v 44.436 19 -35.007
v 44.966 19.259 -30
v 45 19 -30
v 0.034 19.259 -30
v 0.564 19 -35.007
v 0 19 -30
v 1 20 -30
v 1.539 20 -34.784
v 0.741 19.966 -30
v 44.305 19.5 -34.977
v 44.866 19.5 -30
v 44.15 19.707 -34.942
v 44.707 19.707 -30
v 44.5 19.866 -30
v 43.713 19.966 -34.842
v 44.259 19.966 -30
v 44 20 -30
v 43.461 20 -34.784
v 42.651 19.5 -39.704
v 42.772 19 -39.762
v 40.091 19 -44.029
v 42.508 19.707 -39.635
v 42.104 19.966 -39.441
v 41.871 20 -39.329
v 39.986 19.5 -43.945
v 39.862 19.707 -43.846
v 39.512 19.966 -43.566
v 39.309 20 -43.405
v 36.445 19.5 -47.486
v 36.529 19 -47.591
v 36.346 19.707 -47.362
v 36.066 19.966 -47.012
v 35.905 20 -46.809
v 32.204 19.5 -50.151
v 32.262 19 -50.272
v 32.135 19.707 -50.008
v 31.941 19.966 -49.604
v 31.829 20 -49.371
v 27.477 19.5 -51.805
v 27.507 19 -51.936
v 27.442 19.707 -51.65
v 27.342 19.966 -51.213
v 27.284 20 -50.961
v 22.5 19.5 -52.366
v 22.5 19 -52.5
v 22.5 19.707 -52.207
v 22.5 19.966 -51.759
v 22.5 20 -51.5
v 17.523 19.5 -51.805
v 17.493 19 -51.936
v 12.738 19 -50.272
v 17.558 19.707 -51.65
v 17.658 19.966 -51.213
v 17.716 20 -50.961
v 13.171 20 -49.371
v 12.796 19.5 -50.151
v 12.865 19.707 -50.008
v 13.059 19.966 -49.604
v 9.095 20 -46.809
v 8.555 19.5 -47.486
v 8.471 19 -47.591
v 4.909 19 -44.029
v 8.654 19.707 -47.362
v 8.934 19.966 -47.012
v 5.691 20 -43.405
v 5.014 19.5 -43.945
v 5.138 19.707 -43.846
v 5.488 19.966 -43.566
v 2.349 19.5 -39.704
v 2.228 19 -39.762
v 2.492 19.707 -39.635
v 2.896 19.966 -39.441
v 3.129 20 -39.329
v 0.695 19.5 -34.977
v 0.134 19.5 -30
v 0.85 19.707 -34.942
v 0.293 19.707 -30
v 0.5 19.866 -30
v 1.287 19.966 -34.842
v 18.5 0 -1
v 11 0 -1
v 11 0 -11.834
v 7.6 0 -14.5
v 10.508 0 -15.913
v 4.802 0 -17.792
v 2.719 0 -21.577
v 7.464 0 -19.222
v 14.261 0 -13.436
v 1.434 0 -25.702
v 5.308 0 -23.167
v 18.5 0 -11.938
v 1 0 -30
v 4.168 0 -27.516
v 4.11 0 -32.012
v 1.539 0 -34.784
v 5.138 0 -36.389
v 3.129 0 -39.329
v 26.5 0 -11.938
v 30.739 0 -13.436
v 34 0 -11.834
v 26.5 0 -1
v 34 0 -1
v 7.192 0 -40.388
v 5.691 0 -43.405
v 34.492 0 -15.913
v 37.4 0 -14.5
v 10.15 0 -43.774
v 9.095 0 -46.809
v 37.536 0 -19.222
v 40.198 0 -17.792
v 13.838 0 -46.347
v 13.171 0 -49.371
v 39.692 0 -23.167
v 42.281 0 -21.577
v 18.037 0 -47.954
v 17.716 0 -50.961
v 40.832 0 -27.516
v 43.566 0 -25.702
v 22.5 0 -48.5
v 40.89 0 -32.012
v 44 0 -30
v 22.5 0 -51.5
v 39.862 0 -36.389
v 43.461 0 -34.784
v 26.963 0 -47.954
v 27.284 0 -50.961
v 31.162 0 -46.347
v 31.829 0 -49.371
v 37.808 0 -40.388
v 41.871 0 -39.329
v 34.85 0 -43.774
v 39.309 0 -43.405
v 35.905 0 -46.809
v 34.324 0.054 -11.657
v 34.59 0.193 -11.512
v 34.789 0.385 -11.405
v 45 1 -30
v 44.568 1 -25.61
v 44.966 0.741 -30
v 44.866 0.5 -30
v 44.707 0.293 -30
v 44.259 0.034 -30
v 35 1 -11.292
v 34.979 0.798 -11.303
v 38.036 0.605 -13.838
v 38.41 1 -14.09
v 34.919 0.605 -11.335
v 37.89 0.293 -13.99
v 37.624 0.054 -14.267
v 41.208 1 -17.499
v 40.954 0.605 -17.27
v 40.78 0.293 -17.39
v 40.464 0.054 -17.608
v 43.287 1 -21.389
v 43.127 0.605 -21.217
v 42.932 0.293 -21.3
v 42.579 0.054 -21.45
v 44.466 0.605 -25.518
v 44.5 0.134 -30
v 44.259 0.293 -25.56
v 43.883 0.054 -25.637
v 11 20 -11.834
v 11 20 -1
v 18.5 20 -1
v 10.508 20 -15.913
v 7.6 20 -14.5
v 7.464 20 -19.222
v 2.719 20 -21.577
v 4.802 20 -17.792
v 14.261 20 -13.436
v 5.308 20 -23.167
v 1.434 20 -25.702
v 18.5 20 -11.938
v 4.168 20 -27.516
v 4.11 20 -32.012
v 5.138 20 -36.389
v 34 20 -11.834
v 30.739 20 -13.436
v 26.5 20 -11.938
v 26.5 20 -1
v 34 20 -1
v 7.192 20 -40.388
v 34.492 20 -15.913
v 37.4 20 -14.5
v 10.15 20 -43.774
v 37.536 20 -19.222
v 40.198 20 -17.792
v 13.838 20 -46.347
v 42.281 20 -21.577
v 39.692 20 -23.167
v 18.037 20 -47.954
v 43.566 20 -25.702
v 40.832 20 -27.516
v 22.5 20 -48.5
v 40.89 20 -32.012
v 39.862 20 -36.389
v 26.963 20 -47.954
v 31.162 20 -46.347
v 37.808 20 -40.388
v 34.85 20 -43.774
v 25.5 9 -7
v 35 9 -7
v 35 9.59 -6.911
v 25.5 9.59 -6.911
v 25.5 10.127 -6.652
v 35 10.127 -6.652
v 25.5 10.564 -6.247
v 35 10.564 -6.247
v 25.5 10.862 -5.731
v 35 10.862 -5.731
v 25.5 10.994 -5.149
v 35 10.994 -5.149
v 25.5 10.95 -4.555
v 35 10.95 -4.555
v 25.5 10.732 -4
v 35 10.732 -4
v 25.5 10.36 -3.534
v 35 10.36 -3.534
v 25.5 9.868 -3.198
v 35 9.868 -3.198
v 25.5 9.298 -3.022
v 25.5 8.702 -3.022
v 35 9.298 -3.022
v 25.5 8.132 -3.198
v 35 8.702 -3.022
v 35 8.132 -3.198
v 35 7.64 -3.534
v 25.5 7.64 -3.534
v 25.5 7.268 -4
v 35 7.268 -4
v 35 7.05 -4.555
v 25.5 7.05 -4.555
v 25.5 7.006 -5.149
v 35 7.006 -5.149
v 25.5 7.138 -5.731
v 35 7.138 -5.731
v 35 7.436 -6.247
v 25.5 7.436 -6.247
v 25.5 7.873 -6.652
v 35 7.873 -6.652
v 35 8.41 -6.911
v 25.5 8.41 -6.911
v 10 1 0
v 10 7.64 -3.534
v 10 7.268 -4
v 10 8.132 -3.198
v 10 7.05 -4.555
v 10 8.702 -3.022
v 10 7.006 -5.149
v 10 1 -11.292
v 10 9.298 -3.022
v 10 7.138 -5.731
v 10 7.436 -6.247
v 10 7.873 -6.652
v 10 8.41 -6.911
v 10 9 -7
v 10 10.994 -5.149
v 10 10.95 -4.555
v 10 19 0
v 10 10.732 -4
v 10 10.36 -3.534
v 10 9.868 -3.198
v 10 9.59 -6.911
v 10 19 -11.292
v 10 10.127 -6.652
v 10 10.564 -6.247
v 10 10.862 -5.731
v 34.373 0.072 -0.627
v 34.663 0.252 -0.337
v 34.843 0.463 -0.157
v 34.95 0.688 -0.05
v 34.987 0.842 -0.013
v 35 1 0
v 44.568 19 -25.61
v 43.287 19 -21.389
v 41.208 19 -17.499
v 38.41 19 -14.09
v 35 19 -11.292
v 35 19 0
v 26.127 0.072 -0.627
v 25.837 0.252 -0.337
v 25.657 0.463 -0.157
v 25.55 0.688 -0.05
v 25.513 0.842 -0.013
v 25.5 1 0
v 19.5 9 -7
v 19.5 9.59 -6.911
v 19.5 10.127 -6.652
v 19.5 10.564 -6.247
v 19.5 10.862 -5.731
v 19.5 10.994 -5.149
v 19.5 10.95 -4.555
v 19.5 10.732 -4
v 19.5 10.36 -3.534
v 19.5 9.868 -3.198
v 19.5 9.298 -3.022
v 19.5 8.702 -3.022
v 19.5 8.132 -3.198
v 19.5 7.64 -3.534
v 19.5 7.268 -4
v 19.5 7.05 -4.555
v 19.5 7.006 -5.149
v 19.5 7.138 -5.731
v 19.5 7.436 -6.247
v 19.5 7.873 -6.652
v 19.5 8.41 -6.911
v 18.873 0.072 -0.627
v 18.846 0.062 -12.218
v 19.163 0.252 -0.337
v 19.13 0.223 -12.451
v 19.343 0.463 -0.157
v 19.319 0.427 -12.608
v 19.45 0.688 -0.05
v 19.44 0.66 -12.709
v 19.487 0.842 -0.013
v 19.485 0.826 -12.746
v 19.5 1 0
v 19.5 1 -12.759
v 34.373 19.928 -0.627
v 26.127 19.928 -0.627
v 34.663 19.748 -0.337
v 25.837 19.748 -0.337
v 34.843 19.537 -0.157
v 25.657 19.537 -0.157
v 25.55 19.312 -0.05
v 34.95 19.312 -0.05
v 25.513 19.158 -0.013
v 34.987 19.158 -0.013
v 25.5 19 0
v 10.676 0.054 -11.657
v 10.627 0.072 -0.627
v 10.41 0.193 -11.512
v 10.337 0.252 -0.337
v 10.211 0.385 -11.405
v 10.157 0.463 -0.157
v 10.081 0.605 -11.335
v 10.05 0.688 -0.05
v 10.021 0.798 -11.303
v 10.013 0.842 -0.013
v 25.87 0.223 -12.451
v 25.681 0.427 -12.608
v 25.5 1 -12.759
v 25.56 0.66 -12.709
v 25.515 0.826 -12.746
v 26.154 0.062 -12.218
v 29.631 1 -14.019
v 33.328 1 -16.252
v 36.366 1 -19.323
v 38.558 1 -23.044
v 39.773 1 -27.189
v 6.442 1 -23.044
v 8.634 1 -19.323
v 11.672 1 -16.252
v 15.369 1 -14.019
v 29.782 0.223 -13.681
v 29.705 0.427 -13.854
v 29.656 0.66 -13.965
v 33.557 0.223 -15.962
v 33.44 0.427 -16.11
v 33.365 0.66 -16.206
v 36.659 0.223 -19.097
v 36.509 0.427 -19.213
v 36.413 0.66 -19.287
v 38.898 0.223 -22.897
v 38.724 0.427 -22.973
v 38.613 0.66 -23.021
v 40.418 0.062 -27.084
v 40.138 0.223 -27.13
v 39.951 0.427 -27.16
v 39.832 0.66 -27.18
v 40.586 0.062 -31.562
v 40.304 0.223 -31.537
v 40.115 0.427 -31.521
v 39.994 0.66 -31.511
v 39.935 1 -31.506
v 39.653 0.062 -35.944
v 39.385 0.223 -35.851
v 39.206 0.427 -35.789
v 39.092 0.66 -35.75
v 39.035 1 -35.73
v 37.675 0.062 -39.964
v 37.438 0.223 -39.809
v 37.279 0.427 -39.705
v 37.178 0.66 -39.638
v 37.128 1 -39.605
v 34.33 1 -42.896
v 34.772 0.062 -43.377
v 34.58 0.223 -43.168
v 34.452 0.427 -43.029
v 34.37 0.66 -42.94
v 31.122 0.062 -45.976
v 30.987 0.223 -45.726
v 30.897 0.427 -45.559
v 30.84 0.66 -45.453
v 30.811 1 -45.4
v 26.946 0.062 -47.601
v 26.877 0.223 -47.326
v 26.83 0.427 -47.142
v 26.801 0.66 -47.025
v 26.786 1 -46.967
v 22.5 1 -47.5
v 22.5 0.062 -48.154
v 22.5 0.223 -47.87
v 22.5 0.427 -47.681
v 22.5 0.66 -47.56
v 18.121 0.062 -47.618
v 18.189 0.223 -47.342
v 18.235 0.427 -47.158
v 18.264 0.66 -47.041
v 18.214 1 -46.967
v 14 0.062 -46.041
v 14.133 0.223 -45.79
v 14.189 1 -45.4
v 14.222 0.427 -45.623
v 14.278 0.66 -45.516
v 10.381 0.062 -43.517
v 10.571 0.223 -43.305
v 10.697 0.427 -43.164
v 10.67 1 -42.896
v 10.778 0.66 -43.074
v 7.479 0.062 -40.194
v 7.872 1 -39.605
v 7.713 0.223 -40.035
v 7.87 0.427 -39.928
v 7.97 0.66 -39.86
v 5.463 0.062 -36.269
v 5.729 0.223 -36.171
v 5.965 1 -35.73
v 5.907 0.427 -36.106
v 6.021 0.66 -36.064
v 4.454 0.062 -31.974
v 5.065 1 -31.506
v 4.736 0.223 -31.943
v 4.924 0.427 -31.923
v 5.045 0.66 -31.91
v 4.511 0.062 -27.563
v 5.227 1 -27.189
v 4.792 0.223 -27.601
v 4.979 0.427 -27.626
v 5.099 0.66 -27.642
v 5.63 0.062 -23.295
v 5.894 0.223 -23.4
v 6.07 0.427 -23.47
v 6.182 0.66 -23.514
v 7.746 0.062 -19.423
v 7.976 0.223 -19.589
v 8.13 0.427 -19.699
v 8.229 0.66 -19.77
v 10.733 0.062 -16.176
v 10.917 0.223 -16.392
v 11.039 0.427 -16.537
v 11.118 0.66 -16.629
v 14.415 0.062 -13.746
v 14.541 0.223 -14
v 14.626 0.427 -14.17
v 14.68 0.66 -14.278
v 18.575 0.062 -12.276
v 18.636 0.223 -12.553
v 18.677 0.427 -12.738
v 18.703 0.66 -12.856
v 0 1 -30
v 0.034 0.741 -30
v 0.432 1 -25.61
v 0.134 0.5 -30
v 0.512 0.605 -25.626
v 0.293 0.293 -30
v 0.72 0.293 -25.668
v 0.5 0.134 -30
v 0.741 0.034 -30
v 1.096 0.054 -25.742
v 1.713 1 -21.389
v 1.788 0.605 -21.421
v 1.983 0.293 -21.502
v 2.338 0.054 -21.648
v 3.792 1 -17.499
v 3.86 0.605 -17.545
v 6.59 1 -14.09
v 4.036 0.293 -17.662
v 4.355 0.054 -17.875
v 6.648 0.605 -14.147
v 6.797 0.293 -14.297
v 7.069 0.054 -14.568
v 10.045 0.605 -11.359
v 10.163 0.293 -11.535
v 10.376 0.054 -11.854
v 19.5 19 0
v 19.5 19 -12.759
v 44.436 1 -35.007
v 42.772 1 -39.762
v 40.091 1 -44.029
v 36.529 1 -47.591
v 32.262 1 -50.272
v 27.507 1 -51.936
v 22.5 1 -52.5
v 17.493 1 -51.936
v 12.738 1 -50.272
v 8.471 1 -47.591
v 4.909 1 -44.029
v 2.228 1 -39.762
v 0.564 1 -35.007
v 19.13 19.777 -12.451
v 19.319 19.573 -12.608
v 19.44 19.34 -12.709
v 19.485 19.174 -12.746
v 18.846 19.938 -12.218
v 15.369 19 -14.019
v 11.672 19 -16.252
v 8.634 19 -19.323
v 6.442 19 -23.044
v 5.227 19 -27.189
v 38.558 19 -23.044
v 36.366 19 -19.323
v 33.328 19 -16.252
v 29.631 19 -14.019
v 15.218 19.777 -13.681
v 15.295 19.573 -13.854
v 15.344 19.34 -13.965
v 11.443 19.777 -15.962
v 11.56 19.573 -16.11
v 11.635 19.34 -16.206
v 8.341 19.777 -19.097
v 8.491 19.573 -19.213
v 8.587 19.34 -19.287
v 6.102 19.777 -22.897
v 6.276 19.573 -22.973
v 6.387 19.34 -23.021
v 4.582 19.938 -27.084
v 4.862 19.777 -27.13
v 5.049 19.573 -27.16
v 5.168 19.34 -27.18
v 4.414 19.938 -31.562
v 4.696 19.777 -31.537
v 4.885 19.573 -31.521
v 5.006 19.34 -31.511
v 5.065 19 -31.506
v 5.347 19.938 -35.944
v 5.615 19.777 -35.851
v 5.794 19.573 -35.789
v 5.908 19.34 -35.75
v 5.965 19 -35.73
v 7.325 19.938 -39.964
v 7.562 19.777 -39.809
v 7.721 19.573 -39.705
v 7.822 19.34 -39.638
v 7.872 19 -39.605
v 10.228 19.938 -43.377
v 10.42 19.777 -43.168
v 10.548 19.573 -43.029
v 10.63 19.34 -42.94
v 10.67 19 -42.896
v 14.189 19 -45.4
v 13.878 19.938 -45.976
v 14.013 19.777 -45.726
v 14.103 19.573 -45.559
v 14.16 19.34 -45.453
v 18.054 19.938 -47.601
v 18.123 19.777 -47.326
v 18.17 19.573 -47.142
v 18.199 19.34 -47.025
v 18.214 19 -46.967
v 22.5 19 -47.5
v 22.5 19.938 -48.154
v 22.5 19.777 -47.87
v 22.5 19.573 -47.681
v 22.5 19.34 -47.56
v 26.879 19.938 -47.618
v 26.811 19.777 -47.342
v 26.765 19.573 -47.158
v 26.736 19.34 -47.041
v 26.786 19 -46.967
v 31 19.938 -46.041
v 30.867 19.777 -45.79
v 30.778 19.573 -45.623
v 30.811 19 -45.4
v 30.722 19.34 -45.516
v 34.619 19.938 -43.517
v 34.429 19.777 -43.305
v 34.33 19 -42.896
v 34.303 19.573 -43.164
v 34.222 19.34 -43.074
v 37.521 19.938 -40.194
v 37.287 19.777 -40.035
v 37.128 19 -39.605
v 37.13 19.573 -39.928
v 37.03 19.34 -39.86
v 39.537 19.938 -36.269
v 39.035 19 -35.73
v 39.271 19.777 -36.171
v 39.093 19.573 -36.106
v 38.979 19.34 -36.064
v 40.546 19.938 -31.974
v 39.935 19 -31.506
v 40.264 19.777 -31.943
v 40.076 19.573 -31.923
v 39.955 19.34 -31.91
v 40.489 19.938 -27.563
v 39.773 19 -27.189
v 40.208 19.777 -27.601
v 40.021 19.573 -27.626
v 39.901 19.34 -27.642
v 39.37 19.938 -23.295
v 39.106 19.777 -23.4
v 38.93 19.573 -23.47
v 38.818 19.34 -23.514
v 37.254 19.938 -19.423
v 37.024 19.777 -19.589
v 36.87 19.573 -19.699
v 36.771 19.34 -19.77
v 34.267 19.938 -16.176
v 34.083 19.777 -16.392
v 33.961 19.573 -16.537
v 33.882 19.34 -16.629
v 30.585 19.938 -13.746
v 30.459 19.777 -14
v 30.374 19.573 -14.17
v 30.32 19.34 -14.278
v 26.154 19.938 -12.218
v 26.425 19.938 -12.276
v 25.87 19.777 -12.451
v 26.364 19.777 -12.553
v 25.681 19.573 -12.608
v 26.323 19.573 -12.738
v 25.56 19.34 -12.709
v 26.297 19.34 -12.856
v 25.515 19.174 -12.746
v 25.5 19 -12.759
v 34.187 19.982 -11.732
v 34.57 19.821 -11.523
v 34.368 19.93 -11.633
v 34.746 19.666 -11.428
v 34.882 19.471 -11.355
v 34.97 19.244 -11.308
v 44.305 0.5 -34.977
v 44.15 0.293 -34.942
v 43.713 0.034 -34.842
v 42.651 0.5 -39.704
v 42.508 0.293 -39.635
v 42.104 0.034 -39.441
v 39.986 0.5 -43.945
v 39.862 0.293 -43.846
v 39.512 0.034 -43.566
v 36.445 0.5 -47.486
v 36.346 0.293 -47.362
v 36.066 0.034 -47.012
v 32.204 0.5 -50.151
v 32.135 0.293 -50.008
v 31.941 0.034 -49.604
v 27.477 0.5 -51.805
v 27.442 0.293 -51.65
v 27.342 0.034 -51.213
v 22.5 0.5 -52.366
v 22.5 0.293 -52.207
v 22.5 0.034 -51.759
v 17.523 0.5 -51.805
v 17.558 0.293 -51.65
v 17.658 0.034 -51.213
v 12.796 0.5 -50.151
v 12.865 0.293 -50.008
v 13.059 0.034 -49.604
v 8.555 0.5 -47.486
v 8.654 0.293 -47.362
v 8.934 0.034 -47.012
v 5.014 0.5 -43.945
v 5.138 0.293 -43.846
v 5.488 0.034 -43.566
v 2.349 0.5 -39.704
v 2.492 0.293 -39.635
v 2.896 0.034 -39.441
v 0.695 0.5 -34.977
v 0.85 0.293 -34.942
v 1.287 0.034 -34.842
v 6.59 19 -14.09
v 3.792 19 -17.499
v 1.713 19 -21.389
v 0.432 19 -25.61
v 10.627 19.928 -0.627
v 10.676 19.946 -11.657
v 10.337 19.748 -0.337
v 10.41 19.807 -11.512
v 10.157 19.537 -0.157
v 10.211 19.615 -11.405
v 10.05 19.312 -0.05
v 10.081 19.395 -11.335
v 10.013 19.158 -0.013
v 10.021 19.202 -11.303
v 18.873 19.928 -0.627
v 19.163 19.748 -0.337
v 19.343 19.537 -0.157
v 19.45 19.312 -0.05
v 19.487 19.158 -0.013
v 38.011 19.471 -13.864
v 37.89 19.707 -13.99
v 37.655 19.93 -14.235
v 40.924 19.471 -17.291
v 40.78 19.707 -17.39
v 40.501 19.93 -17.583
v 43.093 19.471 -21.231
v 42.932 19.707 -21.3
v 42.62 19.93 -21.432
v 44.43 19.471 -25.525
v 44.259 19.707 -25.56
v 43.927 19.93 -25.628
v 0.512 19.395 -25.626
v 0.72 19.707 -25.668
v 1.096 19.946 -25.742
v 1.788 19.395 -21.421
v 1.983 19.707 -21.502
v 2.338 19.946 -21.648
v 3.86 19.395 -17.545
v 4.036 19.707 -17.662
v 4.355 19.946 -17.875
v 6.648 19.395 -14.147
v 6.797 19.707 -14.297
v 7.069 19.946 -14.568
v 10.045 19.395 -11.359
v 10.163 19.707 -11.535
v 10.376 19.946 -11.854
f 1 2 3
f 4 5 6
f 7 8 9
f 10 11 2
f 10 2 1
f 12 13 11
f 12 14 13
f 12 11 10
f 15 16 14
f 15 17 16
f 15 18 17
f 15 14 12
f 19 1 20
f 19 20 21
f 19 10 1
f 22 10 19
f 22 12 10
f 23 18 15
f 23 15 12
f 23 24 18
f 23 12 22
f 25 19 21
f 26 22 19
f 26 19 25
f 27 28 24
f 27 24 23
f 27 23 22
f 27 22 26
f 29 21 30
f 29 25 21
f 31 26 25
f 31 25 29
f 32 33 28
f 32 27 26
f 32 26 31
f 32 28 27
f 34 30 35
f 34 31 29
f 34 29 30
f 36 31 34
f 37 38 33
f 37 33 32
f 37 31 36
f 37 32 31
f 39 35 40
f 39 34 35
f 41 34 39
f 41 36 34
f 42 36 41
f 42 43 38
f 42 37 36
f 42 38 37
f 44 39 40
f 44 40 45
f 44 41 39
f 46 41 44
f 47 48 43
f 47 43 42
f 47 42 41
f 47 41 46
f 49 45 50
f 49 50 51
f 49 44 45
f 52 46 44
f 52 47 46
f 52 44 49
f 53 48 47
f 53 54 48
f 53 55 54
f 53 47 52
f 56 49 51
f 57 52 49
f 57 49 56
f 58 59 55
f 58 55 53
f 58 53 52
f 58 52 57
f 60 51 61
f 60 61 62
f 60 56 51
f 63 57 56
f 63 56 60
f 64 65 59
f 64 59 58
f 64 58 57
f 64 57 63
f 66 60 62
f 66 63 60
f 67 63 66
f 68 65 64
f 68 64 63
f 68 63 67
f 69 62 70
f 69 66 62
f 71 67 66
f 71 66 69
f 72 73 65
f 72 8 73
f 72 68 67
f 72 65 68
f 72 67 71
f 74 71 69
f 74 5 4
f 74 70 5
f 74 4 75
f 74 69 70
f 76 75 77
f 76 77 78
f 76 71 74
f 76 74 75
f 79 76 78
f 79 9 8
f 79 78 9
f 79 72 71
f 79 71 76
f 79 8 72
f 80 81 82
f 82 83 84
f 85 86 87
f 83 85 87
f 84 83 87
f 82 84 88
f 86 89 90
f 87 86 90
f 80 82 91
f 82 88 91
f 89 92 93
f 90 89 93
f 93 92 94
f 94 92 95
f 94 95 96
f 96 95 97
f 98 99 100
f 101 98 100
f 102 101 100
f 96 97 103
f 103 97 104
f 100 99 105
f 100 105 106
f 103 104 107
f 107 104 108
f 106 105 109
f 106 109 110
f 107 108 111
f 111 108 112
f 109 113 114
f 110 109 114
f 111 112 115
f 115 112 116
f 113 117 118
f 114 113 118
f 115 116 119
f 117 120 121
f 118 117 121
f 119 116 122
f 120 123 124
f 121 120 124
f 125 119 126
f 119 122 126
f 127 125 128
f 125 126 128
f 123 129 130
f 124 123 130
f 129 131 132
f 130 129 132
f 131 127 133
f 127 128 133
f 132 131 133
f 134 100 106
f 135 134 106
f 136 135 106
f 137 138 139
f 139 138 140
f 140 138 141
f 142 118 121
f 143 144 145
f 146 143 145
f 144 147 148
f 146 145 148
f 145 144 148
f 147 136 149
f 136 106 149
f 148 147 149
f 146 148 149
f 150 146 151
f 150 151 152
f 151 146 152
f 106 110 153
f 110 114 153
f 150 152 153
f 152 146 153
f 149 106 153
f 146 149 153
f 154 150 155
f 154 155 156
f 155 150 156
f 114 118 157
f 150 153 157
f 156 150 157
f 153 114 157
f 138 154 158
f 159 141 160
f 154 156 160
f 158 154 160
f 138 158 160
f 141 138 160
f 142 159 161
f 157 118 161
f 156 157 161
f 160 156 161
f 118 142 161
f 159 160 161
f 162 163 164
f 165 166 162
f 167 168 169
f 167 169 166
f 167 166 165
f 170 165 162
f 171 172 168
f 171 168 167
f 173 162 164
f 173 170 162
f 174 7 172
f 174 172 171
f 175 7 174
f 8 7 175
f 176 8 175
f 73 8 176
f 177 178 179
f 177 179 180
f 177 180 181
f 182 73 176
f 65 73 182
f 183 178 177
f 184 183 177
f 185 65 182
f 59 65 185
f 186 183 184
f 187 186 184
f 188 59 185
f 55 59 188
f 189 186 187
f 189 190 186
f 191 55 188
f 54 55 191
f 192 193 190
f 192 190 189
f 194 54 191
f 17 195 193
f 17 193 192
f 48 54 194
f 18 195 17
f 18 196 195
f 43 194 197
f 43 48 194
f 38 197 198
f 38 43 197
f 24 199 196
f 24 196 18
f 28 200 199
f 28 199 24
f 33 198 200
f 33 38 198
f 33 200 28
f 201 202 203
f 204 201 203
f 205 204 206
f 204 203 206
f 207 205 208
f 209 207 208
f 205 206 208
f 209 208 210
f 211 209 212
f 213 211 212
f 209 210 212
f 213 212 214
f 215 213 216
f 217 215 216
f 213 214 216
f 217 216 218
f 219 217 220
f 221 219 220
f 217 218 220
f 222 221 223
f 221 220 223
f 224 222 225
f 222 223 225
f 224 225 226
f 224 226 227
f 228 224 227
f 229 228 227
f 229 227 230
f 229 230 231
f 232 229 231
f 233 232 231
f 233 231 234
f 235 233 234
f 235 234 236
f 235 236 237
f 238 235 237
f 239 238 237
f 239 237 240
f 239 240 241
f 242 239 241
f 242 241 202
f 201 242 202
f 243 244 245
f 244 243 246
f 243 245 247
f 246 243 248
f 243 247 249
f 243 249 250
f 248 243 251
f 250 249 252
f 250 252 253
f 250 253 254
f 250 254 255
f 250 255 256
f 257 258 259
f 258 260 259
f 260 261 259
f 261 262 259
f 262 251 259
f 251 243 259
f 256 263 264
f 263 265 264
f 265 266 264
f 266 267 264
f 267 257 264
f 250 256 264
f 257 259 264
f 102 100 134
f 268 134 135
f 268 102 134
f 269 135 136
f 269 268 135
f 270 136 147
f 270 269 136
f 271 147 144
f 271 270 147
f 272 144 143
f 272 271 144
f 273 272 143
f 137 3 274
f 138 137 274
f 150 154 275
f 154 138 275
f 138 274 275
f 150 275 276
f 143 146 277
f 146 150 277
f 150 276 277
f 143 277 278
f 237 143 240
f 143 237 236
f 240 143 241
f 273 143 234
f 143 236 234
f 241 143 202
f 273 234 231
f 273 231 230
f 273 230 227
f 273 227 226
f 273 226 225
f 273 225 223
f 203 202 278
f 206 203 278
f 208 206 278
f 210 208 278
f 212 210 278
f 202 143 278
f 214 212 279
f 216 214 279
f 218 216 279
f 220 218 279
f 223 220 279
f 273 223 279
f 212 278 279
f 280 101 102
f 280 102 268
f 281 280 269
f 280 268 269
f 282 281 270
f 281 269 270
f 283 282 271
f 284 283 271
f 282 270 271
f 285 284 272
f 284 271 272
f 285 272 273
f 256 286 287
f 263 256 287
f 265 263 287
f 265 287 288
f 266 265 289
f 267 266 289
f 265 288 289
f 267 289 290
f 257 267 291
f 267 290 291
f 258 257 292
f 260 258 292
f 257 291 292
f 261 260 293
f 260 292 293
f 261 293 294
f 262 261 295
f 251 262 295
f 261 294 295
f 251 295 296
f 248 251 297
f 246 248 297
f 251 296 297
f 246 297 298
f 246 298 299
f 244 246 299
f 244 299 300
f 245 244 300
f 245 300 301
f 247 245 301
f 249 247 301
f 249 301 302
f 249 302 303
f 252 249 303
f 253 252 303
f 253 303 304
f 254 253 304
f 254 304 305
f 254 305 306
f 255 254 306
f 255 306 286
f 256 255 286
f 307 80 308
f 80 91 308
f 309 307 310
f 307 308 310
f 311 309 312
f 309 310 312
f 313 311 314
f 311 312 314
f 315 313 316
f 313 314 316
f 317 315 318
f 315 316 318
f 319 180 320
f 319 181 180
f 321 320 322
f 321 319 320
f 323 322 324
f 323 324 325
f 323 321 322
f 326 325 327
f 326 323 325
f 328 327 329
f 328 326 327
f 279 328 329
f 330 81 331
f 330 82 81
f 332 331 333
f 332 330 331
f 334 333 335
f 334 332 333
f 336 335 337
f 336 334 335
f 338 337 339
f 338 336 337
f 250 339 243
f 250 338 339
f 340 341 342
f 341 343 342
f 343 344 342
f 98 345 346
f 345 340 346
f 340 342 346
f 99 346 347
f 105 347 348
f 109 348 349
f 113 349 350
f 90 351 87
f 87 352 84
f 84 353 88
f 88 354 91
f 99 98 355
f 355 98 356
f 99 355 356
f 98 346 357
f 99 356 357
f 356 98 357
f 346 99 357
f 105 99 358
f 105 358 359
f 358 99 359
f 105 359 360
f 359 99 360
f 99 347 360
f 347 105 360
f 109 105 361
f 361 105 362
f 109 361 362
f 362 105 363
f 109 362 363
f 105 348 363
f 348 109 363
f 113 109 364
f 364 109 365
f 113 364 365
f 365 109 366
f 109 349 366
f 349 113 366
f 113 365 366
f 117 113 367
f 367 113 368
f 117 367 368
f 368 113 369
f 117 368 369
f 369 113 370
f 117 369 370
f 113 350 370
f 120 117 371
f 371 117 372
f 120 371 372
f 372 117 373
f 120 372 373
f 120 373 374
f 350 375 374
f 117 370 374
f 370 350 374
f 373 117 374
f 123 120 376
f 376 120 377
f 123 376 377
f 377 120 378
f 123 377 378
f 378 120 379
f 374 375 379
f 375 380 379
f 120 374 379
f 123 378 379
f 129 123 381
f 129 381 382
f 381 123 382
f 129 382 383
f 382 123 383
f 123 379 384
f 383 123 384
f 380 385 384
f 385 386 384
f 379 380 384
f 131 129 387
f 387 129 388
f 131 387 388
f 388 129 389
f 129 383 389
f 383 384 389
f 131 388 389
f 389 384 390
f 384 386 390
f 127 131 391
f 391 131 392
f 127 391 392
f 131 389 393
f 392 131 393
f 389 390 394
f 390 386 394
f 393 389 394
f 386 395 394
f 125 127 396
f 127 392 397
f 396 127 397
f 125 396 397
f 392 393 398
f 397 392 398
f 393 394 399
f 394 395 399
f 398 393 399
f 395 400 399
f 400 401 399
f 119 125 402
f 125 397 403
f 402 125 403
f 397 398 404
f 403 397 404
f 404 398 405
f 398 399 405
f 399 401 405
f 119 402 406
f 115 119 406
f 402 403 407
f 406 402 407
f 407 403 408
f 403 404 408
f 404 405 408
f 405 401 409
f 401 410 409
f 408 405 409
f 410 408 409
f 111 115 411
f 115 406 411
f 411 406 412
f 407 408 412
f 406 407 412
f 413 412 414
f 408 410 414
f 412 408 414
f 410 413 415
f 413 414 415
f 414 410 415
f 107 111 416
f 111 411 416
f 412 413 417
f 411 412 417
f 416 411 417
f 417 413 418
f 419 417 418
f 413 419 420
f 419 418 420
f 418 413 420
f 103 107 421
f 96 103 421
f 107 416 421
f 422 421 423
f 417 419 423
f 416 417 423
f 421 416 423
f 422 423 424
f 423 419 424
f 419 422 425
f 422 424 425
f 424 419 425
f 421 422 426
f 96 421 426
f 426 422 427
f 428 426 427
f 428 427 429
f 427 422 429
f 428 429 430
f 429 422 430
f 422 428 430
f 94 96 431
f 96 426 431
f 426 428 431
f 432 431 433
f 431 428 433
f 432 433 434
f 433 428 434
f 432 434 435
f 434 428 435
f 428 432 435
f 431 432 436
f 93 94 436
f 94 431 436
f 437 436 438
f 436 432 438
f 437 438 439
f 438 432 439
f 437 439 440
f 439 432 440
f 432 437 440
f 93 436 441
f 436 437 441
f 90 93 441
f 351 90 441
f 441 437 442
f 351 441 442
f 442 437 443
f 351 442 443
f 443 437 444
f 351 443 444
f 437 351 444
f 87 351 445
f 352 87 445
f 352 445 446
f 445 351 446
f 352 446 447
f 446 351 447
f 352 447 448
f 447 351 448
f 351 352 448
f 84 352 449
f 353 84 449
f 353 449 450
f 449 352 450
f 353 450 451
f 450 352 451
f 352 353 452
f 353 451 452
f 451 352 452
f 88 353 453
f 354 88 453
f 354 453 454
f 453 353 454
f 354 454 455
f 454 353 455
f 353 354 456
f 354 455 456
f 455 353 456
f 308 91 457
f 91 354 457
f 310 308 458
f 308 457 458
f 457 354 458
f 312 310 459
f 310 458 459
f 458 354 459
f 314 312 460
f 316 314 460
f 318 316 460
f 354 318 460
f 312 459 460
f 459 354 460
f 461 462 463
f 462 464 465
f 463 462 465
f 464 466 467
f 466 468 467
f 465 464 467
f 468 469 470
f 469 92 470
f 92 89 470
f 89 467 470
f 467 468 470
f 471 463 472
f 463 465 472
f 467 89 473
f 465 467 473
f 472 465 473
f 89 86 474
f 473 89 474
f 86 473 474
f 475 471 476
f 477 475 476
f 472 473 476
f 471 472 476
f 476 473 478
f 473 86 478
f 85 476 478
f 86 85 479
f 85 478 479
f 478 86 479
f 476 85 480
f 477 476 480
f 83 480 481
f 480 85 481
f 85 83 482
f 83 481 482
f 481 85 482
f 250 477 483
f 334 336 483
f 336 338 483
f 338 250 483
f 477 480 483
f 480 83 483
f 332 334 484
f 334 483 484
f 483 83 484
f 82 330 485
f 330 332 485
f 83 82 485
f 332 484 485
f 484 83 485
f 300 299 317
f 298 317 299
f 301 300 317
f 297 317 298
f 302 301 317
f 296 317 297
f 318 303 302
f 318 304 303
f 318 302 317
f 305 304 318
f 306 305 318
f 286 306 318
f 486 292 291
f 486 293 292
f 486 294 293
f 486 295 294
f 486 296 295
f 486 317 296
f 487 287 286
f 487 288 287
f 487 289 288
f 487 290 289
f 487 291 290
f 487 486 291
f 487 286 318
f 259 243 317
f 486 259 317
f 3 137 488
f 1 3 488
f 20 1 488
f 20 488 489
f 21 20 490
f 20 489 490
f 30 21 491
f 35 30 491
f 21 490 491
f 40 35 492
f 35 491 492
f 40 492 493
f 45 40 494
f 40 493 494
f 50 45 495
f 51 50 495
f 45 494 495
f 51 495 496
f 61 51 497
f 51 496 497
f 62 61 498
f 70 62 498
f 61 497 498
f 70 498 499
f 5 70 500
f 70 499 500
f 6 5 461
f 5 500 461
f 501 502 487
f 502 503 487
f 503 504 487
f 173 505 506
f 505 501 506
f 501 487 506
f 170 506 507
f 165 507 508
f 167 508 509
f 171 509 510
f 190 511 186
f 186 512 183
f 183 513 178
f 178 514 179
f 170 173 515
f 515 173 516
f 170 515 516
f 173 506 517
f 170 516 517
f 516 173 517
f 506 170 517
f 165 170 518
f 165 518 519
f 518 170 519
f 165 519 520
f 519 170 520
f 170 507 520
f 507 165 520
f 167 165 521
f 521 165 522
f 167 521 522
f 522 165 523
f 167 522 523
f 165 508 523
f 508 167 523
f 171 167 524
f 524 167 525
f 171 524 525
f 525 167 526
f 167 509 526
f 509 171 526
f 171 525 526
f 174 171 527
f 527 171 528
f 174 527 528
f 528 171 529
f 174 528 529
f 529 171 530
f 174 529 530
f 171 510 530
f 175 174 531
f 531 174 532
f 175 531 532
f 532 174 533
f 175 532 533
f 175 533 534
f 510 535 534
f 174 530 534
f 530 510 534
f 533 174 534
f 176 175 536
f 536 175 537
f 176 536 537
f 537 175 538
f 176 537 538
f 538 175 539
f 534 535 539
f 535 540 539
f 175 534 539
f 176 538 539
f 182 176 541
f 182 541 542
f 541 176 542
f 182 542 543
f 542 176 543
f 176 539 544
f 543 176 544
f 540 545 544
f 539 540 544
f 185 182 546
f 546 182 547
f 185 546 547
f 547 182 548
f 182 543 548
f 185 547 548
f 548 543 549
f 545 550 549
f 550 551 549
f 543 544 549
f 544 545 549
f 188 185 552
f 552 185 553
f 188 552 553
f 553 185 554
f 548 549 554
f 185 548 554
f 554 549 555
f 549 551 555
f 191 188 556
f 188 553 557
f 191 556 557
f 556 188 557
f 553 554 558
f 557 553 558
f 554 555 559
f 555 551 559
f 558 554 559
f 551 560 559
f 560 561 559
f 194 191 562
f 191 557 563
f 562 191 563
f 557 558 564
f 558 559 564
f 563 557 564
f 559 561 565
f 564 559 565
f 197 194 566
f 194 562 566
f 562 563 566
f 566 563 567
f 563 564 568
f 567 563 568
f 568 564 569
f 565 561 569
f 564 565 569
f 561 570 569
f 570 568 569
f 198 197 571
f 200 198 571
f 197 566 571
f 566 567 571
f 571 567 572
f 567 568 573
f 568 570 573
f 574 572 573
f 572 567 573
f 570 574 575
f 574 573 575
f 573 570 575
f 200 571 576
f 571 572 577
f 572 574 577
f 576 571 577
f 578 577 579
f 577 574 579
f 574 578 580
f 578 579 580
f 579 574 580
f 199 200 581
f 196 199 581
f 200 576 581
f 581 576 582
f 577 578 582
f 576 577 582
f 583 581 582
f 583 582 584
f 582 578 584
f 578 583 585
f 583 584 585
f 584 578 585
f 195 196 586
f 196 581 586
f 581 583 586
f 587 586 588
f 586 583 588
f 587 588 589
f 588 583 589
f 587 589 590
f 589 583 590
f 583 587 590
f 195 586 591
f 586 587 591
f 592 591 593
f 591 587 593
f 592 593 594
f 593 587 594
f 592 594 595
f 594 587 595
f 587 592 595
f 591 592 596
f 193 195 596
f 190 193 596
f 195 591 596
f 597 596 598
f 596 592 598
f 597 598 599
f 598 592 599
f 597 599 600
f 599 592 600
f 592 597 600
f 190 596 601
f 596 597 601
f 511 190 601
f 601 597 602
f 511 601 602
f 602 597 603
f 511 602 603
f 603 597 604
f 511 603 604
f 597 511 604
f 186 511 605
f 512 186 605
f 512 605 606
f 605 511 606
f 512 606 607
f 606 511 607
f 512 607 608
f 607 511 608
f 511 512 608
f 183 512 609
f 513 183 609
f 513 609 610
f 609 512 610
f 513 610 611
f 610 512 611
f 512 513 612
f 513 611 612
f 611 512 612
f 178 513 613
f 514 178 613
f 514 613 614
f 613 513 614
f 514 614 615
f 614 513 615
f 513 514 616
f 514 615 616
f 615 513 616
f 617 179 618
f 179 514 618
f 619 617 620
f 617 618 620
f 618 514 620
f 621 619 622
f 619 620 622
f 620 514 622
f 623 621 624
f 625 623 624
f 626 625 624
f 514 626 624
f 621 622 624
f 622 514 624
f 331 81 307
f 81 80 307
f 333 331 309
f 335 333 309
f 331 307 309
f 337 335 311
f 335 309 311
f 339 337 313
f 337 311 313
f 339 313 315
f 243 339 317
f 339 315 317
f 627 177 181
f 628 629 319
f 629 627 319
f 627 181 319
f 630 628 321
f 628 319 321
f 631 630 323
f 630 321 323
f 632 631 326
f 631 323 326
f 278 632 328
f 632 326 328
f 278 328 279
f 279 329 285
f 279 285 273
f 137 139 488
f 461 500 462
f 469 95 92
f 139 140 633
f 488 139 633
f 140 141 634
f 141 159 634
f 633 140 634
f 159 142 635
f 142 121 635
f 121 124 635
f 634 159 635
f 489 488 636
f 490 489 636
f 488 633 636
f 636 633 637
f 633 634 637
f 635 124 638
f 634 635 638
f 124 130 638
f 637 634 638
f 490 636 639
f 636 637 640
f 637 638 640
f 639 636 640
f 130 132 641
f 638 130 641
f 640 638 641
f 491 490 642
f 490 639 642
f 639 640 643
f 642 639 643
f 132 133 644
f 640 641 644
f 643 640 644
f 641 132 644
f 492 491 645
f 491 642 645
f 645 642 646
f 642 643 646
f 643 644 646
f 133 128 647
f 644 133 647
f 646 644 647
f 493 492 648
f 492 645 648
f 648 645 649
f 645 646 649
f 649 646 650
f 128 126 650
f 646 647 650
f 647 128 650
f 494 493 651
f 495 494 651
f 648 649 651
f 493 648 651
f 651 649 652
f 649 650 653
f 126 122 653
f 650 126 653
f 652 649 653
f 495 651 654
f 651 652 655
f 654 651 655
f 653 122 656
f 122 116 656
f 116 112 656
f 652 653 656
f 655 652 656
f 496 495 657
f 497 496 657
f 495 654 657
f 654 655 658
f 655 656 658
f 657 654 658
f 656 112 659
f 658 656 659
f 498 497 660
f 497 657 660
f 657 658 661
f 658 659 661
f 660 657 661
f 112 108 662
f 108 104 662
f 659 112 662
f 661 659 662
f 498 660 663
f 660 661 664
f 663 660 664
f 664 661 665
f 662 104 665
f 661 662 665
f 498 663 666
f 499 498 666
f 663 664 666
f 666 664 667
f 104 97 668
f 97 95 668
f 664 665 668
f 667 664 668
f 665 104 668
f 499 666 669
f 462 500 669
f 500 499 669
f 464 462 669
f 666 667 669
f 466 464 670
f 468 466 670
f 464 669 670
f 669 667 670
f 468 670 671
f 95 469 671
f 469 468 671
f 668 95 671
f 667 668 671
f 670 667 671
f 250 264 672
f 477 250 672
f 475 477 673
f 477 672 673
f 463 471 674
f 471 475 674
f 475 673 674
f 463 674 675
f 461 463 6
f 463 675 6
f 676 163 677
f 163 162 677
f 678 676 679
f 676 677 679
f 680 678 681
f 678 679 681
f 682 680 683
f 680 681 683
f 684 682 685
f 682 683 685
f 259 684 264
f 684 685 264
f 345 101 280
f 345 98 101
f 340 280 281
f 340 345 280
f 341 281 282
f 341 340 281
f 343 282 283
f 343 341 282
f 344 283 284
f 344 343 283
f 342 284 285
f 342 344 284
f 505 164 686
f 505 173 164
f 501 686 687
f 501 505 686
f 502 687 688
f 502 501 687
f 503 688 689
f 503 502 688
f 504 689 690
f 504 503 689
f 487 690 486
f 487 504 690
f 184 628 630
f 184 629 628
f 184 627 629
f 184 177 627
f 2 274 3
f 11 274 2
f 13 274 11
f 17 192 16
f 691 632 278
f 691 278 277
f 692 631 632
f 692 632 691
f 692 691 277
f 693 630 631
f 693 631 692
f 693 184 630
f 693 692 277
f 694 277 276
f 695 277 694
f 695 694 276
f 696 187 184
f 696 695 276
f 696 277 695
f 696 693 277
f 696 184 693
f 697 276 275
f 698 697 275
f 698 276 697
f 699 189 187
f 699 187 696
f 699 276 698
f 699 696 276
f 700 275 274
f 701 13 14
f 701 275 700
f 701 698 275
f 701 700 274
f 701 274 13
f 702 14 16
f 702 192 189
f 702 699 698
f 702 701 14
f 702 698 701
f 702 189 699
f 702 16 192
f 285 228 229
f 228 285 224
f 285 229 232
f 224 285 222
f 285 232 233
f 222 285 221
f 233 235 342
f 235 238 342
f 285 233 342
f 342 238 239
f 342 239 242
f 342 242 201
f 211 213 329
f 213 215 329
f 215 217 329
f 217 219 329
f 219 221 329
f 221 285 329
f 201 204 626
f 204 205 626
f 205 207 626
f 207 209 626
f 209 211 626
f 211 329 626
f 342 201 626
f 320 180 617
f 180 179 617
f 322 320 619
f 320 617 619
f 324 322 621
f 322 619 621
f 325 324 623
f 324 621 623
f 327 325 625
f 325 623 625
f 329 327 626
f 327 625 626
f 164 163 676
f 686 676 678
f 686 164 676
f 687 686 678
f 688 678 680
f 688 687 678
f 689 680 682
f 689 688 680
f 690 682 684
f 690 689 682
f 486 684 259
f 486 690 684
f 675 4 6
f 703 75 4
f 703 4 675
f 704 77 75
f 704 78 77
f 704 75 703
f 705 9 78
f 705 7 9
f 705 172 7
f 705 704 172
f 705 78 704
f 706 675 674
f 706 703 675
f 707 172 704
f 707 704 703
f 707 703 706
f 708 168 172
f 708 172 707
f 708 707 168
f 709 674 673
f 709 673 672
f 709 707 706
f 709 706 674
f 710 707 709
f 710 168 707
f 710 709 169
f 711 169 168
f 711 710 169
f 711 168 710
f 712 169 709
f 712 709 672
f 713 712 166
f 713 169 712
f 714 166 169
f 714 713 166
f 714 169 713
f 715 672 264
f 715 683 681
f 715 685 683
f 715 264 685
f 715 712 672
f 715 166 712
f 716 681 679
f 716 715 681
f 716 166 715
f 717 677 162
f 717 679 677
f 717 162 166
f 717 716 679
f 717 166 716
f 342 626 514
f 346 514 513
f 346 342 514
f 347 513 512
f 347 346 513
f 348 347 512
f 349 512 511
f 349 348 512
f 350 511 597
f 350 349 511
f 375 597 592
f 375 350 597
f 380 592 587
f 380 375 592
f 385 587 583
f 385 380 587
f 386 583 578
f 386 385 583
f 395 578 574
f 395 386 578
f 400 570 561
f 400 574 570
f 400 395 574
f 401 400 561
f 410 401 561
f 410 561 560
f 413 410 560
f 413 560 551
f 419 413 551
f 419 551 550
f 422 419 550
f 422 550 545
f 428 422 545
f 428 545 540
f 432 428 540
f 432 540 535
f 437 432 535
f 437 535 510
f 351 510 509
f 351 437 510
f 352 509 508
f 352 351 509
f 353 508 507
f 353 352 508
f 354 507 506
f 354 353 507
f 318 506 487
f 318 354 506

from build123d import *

# Parameters (mm, degrees)
SKETCH1_R           = 17.5
BOSS_EXTRUDE1_DEPTH = 20
SKETCH2_W           = 6
SKETCH2_H           = 12.75906035
CUT_EXTRUDE2_DEPTH  = 20
CUT_EXTRUDE5_DEPTH  = 20
FILLET5_R           = 1
SKETCH6_R           = 2
CUT_EXTRUDE7_DEPTH  = 29


with BuildPart() as part:
    # Sketch1 → Boss-Extrude1 (new body)
    with BuildSketch(Plane(origin=(0, 0, 0), x_dir=(1, 0, 0), z_dir=(0, 1, 0))):
        with BuildLine():
            Line((0, 30), (0, 0))
            Line((0, 0), (45, 0))
            Line((45, 0), (45, 30))
            ThreePointArc((45, 30), (22.5, 52.5), (0, 30))
        make_face()
        with Locations((22.5, 30)):
            Circle(SKETCH1_R, mode=Mode.SUBTRACT)
    extrude(amount=BOSS_EXTRUDE1_DEPTH)

    # Sketch2 → Cut-Extrude2 (cut)
    with BuildSketch(Plane(origin=(0, 20, 0), x_dir=(1, 0, 0), z_dir=(0, 1, 0))):
        with Locations((22.5, 6.379530175)):
            Rectangle(SKETCH2_W, SKETCH2_H)
    extrude(amount=-CUT_EXTRUDE2_DEPTH, mode=Mode.SUBTRACT)

    # Sketch5 → Cut-Extrude5 (cut)
    with BuildSketch(Plane(origin=(0, 20, 0), x_dir=(1, 0, 0), z_dir=(0, 1, 0))):
        with BuildLine():
            Line((10, 0), (10, 11.291713066))
            ThreePointArc((10, 11.291713066), (2.656865167, 19.393398282), (0, 30))
            Line((0, 30), (0, 0))
            Line((0, 0), (10, 0))
        make_face()
        with BuildLine():
            Line((45, 0), (45, 30))
            ThreePointArc((45, 30), (42.343134833, 19.393398282), (35, 11.291713066))
            Line((35, 11.291713066), (35, 0))
            Line((35, 0), (45, 0))
        make_face()
    extrude(amount=-CUT_EXTRUDE5_DEPTH, mode=Mode.SUBTRACT)

    # Fillet5
    fillet5_edges = [part.edges().sort_by_distance(p)[0] for p in [
        (22.5, 0, -47.5),
        (22.5, 20, -47.5),
        (30.25, 0, 0),
        (30.25, 20, 0),
        (19.5, 0, -6.379530175),
        (25.5, 0, -6.379530175),
        (25.5, 20, -6.379530175),
        (19.5, 20, -6.379530175),
        (14.75, 0, 0),
        (14.75, 20, 0),
        (10, 0, -5.645856533),
        (10, 20, -5.645856533),
        (22.5, 20, -52.5),
        (35, 20, -5.645856533),
        (35, 0, -5.645856533),
        (22.5, 0, -52.5),
    ]]
    fillet(fillet5_edges, radius=FILLET5_R)

    # Sketch6 → Cut-Extrude7 (cut)
    with BuildSketch(Plane(origin=(35, 0, 0), x_dir=(0, 0, -1), z_dir=(1, 0, 0))):
        with Locations((5, 9)):
            Circle(SKETCH6_R)
    extrude(amount=-CUT_EXTRUDE7_DEPTH, mode=Mode.SUBTRACT)


solid = part.part
